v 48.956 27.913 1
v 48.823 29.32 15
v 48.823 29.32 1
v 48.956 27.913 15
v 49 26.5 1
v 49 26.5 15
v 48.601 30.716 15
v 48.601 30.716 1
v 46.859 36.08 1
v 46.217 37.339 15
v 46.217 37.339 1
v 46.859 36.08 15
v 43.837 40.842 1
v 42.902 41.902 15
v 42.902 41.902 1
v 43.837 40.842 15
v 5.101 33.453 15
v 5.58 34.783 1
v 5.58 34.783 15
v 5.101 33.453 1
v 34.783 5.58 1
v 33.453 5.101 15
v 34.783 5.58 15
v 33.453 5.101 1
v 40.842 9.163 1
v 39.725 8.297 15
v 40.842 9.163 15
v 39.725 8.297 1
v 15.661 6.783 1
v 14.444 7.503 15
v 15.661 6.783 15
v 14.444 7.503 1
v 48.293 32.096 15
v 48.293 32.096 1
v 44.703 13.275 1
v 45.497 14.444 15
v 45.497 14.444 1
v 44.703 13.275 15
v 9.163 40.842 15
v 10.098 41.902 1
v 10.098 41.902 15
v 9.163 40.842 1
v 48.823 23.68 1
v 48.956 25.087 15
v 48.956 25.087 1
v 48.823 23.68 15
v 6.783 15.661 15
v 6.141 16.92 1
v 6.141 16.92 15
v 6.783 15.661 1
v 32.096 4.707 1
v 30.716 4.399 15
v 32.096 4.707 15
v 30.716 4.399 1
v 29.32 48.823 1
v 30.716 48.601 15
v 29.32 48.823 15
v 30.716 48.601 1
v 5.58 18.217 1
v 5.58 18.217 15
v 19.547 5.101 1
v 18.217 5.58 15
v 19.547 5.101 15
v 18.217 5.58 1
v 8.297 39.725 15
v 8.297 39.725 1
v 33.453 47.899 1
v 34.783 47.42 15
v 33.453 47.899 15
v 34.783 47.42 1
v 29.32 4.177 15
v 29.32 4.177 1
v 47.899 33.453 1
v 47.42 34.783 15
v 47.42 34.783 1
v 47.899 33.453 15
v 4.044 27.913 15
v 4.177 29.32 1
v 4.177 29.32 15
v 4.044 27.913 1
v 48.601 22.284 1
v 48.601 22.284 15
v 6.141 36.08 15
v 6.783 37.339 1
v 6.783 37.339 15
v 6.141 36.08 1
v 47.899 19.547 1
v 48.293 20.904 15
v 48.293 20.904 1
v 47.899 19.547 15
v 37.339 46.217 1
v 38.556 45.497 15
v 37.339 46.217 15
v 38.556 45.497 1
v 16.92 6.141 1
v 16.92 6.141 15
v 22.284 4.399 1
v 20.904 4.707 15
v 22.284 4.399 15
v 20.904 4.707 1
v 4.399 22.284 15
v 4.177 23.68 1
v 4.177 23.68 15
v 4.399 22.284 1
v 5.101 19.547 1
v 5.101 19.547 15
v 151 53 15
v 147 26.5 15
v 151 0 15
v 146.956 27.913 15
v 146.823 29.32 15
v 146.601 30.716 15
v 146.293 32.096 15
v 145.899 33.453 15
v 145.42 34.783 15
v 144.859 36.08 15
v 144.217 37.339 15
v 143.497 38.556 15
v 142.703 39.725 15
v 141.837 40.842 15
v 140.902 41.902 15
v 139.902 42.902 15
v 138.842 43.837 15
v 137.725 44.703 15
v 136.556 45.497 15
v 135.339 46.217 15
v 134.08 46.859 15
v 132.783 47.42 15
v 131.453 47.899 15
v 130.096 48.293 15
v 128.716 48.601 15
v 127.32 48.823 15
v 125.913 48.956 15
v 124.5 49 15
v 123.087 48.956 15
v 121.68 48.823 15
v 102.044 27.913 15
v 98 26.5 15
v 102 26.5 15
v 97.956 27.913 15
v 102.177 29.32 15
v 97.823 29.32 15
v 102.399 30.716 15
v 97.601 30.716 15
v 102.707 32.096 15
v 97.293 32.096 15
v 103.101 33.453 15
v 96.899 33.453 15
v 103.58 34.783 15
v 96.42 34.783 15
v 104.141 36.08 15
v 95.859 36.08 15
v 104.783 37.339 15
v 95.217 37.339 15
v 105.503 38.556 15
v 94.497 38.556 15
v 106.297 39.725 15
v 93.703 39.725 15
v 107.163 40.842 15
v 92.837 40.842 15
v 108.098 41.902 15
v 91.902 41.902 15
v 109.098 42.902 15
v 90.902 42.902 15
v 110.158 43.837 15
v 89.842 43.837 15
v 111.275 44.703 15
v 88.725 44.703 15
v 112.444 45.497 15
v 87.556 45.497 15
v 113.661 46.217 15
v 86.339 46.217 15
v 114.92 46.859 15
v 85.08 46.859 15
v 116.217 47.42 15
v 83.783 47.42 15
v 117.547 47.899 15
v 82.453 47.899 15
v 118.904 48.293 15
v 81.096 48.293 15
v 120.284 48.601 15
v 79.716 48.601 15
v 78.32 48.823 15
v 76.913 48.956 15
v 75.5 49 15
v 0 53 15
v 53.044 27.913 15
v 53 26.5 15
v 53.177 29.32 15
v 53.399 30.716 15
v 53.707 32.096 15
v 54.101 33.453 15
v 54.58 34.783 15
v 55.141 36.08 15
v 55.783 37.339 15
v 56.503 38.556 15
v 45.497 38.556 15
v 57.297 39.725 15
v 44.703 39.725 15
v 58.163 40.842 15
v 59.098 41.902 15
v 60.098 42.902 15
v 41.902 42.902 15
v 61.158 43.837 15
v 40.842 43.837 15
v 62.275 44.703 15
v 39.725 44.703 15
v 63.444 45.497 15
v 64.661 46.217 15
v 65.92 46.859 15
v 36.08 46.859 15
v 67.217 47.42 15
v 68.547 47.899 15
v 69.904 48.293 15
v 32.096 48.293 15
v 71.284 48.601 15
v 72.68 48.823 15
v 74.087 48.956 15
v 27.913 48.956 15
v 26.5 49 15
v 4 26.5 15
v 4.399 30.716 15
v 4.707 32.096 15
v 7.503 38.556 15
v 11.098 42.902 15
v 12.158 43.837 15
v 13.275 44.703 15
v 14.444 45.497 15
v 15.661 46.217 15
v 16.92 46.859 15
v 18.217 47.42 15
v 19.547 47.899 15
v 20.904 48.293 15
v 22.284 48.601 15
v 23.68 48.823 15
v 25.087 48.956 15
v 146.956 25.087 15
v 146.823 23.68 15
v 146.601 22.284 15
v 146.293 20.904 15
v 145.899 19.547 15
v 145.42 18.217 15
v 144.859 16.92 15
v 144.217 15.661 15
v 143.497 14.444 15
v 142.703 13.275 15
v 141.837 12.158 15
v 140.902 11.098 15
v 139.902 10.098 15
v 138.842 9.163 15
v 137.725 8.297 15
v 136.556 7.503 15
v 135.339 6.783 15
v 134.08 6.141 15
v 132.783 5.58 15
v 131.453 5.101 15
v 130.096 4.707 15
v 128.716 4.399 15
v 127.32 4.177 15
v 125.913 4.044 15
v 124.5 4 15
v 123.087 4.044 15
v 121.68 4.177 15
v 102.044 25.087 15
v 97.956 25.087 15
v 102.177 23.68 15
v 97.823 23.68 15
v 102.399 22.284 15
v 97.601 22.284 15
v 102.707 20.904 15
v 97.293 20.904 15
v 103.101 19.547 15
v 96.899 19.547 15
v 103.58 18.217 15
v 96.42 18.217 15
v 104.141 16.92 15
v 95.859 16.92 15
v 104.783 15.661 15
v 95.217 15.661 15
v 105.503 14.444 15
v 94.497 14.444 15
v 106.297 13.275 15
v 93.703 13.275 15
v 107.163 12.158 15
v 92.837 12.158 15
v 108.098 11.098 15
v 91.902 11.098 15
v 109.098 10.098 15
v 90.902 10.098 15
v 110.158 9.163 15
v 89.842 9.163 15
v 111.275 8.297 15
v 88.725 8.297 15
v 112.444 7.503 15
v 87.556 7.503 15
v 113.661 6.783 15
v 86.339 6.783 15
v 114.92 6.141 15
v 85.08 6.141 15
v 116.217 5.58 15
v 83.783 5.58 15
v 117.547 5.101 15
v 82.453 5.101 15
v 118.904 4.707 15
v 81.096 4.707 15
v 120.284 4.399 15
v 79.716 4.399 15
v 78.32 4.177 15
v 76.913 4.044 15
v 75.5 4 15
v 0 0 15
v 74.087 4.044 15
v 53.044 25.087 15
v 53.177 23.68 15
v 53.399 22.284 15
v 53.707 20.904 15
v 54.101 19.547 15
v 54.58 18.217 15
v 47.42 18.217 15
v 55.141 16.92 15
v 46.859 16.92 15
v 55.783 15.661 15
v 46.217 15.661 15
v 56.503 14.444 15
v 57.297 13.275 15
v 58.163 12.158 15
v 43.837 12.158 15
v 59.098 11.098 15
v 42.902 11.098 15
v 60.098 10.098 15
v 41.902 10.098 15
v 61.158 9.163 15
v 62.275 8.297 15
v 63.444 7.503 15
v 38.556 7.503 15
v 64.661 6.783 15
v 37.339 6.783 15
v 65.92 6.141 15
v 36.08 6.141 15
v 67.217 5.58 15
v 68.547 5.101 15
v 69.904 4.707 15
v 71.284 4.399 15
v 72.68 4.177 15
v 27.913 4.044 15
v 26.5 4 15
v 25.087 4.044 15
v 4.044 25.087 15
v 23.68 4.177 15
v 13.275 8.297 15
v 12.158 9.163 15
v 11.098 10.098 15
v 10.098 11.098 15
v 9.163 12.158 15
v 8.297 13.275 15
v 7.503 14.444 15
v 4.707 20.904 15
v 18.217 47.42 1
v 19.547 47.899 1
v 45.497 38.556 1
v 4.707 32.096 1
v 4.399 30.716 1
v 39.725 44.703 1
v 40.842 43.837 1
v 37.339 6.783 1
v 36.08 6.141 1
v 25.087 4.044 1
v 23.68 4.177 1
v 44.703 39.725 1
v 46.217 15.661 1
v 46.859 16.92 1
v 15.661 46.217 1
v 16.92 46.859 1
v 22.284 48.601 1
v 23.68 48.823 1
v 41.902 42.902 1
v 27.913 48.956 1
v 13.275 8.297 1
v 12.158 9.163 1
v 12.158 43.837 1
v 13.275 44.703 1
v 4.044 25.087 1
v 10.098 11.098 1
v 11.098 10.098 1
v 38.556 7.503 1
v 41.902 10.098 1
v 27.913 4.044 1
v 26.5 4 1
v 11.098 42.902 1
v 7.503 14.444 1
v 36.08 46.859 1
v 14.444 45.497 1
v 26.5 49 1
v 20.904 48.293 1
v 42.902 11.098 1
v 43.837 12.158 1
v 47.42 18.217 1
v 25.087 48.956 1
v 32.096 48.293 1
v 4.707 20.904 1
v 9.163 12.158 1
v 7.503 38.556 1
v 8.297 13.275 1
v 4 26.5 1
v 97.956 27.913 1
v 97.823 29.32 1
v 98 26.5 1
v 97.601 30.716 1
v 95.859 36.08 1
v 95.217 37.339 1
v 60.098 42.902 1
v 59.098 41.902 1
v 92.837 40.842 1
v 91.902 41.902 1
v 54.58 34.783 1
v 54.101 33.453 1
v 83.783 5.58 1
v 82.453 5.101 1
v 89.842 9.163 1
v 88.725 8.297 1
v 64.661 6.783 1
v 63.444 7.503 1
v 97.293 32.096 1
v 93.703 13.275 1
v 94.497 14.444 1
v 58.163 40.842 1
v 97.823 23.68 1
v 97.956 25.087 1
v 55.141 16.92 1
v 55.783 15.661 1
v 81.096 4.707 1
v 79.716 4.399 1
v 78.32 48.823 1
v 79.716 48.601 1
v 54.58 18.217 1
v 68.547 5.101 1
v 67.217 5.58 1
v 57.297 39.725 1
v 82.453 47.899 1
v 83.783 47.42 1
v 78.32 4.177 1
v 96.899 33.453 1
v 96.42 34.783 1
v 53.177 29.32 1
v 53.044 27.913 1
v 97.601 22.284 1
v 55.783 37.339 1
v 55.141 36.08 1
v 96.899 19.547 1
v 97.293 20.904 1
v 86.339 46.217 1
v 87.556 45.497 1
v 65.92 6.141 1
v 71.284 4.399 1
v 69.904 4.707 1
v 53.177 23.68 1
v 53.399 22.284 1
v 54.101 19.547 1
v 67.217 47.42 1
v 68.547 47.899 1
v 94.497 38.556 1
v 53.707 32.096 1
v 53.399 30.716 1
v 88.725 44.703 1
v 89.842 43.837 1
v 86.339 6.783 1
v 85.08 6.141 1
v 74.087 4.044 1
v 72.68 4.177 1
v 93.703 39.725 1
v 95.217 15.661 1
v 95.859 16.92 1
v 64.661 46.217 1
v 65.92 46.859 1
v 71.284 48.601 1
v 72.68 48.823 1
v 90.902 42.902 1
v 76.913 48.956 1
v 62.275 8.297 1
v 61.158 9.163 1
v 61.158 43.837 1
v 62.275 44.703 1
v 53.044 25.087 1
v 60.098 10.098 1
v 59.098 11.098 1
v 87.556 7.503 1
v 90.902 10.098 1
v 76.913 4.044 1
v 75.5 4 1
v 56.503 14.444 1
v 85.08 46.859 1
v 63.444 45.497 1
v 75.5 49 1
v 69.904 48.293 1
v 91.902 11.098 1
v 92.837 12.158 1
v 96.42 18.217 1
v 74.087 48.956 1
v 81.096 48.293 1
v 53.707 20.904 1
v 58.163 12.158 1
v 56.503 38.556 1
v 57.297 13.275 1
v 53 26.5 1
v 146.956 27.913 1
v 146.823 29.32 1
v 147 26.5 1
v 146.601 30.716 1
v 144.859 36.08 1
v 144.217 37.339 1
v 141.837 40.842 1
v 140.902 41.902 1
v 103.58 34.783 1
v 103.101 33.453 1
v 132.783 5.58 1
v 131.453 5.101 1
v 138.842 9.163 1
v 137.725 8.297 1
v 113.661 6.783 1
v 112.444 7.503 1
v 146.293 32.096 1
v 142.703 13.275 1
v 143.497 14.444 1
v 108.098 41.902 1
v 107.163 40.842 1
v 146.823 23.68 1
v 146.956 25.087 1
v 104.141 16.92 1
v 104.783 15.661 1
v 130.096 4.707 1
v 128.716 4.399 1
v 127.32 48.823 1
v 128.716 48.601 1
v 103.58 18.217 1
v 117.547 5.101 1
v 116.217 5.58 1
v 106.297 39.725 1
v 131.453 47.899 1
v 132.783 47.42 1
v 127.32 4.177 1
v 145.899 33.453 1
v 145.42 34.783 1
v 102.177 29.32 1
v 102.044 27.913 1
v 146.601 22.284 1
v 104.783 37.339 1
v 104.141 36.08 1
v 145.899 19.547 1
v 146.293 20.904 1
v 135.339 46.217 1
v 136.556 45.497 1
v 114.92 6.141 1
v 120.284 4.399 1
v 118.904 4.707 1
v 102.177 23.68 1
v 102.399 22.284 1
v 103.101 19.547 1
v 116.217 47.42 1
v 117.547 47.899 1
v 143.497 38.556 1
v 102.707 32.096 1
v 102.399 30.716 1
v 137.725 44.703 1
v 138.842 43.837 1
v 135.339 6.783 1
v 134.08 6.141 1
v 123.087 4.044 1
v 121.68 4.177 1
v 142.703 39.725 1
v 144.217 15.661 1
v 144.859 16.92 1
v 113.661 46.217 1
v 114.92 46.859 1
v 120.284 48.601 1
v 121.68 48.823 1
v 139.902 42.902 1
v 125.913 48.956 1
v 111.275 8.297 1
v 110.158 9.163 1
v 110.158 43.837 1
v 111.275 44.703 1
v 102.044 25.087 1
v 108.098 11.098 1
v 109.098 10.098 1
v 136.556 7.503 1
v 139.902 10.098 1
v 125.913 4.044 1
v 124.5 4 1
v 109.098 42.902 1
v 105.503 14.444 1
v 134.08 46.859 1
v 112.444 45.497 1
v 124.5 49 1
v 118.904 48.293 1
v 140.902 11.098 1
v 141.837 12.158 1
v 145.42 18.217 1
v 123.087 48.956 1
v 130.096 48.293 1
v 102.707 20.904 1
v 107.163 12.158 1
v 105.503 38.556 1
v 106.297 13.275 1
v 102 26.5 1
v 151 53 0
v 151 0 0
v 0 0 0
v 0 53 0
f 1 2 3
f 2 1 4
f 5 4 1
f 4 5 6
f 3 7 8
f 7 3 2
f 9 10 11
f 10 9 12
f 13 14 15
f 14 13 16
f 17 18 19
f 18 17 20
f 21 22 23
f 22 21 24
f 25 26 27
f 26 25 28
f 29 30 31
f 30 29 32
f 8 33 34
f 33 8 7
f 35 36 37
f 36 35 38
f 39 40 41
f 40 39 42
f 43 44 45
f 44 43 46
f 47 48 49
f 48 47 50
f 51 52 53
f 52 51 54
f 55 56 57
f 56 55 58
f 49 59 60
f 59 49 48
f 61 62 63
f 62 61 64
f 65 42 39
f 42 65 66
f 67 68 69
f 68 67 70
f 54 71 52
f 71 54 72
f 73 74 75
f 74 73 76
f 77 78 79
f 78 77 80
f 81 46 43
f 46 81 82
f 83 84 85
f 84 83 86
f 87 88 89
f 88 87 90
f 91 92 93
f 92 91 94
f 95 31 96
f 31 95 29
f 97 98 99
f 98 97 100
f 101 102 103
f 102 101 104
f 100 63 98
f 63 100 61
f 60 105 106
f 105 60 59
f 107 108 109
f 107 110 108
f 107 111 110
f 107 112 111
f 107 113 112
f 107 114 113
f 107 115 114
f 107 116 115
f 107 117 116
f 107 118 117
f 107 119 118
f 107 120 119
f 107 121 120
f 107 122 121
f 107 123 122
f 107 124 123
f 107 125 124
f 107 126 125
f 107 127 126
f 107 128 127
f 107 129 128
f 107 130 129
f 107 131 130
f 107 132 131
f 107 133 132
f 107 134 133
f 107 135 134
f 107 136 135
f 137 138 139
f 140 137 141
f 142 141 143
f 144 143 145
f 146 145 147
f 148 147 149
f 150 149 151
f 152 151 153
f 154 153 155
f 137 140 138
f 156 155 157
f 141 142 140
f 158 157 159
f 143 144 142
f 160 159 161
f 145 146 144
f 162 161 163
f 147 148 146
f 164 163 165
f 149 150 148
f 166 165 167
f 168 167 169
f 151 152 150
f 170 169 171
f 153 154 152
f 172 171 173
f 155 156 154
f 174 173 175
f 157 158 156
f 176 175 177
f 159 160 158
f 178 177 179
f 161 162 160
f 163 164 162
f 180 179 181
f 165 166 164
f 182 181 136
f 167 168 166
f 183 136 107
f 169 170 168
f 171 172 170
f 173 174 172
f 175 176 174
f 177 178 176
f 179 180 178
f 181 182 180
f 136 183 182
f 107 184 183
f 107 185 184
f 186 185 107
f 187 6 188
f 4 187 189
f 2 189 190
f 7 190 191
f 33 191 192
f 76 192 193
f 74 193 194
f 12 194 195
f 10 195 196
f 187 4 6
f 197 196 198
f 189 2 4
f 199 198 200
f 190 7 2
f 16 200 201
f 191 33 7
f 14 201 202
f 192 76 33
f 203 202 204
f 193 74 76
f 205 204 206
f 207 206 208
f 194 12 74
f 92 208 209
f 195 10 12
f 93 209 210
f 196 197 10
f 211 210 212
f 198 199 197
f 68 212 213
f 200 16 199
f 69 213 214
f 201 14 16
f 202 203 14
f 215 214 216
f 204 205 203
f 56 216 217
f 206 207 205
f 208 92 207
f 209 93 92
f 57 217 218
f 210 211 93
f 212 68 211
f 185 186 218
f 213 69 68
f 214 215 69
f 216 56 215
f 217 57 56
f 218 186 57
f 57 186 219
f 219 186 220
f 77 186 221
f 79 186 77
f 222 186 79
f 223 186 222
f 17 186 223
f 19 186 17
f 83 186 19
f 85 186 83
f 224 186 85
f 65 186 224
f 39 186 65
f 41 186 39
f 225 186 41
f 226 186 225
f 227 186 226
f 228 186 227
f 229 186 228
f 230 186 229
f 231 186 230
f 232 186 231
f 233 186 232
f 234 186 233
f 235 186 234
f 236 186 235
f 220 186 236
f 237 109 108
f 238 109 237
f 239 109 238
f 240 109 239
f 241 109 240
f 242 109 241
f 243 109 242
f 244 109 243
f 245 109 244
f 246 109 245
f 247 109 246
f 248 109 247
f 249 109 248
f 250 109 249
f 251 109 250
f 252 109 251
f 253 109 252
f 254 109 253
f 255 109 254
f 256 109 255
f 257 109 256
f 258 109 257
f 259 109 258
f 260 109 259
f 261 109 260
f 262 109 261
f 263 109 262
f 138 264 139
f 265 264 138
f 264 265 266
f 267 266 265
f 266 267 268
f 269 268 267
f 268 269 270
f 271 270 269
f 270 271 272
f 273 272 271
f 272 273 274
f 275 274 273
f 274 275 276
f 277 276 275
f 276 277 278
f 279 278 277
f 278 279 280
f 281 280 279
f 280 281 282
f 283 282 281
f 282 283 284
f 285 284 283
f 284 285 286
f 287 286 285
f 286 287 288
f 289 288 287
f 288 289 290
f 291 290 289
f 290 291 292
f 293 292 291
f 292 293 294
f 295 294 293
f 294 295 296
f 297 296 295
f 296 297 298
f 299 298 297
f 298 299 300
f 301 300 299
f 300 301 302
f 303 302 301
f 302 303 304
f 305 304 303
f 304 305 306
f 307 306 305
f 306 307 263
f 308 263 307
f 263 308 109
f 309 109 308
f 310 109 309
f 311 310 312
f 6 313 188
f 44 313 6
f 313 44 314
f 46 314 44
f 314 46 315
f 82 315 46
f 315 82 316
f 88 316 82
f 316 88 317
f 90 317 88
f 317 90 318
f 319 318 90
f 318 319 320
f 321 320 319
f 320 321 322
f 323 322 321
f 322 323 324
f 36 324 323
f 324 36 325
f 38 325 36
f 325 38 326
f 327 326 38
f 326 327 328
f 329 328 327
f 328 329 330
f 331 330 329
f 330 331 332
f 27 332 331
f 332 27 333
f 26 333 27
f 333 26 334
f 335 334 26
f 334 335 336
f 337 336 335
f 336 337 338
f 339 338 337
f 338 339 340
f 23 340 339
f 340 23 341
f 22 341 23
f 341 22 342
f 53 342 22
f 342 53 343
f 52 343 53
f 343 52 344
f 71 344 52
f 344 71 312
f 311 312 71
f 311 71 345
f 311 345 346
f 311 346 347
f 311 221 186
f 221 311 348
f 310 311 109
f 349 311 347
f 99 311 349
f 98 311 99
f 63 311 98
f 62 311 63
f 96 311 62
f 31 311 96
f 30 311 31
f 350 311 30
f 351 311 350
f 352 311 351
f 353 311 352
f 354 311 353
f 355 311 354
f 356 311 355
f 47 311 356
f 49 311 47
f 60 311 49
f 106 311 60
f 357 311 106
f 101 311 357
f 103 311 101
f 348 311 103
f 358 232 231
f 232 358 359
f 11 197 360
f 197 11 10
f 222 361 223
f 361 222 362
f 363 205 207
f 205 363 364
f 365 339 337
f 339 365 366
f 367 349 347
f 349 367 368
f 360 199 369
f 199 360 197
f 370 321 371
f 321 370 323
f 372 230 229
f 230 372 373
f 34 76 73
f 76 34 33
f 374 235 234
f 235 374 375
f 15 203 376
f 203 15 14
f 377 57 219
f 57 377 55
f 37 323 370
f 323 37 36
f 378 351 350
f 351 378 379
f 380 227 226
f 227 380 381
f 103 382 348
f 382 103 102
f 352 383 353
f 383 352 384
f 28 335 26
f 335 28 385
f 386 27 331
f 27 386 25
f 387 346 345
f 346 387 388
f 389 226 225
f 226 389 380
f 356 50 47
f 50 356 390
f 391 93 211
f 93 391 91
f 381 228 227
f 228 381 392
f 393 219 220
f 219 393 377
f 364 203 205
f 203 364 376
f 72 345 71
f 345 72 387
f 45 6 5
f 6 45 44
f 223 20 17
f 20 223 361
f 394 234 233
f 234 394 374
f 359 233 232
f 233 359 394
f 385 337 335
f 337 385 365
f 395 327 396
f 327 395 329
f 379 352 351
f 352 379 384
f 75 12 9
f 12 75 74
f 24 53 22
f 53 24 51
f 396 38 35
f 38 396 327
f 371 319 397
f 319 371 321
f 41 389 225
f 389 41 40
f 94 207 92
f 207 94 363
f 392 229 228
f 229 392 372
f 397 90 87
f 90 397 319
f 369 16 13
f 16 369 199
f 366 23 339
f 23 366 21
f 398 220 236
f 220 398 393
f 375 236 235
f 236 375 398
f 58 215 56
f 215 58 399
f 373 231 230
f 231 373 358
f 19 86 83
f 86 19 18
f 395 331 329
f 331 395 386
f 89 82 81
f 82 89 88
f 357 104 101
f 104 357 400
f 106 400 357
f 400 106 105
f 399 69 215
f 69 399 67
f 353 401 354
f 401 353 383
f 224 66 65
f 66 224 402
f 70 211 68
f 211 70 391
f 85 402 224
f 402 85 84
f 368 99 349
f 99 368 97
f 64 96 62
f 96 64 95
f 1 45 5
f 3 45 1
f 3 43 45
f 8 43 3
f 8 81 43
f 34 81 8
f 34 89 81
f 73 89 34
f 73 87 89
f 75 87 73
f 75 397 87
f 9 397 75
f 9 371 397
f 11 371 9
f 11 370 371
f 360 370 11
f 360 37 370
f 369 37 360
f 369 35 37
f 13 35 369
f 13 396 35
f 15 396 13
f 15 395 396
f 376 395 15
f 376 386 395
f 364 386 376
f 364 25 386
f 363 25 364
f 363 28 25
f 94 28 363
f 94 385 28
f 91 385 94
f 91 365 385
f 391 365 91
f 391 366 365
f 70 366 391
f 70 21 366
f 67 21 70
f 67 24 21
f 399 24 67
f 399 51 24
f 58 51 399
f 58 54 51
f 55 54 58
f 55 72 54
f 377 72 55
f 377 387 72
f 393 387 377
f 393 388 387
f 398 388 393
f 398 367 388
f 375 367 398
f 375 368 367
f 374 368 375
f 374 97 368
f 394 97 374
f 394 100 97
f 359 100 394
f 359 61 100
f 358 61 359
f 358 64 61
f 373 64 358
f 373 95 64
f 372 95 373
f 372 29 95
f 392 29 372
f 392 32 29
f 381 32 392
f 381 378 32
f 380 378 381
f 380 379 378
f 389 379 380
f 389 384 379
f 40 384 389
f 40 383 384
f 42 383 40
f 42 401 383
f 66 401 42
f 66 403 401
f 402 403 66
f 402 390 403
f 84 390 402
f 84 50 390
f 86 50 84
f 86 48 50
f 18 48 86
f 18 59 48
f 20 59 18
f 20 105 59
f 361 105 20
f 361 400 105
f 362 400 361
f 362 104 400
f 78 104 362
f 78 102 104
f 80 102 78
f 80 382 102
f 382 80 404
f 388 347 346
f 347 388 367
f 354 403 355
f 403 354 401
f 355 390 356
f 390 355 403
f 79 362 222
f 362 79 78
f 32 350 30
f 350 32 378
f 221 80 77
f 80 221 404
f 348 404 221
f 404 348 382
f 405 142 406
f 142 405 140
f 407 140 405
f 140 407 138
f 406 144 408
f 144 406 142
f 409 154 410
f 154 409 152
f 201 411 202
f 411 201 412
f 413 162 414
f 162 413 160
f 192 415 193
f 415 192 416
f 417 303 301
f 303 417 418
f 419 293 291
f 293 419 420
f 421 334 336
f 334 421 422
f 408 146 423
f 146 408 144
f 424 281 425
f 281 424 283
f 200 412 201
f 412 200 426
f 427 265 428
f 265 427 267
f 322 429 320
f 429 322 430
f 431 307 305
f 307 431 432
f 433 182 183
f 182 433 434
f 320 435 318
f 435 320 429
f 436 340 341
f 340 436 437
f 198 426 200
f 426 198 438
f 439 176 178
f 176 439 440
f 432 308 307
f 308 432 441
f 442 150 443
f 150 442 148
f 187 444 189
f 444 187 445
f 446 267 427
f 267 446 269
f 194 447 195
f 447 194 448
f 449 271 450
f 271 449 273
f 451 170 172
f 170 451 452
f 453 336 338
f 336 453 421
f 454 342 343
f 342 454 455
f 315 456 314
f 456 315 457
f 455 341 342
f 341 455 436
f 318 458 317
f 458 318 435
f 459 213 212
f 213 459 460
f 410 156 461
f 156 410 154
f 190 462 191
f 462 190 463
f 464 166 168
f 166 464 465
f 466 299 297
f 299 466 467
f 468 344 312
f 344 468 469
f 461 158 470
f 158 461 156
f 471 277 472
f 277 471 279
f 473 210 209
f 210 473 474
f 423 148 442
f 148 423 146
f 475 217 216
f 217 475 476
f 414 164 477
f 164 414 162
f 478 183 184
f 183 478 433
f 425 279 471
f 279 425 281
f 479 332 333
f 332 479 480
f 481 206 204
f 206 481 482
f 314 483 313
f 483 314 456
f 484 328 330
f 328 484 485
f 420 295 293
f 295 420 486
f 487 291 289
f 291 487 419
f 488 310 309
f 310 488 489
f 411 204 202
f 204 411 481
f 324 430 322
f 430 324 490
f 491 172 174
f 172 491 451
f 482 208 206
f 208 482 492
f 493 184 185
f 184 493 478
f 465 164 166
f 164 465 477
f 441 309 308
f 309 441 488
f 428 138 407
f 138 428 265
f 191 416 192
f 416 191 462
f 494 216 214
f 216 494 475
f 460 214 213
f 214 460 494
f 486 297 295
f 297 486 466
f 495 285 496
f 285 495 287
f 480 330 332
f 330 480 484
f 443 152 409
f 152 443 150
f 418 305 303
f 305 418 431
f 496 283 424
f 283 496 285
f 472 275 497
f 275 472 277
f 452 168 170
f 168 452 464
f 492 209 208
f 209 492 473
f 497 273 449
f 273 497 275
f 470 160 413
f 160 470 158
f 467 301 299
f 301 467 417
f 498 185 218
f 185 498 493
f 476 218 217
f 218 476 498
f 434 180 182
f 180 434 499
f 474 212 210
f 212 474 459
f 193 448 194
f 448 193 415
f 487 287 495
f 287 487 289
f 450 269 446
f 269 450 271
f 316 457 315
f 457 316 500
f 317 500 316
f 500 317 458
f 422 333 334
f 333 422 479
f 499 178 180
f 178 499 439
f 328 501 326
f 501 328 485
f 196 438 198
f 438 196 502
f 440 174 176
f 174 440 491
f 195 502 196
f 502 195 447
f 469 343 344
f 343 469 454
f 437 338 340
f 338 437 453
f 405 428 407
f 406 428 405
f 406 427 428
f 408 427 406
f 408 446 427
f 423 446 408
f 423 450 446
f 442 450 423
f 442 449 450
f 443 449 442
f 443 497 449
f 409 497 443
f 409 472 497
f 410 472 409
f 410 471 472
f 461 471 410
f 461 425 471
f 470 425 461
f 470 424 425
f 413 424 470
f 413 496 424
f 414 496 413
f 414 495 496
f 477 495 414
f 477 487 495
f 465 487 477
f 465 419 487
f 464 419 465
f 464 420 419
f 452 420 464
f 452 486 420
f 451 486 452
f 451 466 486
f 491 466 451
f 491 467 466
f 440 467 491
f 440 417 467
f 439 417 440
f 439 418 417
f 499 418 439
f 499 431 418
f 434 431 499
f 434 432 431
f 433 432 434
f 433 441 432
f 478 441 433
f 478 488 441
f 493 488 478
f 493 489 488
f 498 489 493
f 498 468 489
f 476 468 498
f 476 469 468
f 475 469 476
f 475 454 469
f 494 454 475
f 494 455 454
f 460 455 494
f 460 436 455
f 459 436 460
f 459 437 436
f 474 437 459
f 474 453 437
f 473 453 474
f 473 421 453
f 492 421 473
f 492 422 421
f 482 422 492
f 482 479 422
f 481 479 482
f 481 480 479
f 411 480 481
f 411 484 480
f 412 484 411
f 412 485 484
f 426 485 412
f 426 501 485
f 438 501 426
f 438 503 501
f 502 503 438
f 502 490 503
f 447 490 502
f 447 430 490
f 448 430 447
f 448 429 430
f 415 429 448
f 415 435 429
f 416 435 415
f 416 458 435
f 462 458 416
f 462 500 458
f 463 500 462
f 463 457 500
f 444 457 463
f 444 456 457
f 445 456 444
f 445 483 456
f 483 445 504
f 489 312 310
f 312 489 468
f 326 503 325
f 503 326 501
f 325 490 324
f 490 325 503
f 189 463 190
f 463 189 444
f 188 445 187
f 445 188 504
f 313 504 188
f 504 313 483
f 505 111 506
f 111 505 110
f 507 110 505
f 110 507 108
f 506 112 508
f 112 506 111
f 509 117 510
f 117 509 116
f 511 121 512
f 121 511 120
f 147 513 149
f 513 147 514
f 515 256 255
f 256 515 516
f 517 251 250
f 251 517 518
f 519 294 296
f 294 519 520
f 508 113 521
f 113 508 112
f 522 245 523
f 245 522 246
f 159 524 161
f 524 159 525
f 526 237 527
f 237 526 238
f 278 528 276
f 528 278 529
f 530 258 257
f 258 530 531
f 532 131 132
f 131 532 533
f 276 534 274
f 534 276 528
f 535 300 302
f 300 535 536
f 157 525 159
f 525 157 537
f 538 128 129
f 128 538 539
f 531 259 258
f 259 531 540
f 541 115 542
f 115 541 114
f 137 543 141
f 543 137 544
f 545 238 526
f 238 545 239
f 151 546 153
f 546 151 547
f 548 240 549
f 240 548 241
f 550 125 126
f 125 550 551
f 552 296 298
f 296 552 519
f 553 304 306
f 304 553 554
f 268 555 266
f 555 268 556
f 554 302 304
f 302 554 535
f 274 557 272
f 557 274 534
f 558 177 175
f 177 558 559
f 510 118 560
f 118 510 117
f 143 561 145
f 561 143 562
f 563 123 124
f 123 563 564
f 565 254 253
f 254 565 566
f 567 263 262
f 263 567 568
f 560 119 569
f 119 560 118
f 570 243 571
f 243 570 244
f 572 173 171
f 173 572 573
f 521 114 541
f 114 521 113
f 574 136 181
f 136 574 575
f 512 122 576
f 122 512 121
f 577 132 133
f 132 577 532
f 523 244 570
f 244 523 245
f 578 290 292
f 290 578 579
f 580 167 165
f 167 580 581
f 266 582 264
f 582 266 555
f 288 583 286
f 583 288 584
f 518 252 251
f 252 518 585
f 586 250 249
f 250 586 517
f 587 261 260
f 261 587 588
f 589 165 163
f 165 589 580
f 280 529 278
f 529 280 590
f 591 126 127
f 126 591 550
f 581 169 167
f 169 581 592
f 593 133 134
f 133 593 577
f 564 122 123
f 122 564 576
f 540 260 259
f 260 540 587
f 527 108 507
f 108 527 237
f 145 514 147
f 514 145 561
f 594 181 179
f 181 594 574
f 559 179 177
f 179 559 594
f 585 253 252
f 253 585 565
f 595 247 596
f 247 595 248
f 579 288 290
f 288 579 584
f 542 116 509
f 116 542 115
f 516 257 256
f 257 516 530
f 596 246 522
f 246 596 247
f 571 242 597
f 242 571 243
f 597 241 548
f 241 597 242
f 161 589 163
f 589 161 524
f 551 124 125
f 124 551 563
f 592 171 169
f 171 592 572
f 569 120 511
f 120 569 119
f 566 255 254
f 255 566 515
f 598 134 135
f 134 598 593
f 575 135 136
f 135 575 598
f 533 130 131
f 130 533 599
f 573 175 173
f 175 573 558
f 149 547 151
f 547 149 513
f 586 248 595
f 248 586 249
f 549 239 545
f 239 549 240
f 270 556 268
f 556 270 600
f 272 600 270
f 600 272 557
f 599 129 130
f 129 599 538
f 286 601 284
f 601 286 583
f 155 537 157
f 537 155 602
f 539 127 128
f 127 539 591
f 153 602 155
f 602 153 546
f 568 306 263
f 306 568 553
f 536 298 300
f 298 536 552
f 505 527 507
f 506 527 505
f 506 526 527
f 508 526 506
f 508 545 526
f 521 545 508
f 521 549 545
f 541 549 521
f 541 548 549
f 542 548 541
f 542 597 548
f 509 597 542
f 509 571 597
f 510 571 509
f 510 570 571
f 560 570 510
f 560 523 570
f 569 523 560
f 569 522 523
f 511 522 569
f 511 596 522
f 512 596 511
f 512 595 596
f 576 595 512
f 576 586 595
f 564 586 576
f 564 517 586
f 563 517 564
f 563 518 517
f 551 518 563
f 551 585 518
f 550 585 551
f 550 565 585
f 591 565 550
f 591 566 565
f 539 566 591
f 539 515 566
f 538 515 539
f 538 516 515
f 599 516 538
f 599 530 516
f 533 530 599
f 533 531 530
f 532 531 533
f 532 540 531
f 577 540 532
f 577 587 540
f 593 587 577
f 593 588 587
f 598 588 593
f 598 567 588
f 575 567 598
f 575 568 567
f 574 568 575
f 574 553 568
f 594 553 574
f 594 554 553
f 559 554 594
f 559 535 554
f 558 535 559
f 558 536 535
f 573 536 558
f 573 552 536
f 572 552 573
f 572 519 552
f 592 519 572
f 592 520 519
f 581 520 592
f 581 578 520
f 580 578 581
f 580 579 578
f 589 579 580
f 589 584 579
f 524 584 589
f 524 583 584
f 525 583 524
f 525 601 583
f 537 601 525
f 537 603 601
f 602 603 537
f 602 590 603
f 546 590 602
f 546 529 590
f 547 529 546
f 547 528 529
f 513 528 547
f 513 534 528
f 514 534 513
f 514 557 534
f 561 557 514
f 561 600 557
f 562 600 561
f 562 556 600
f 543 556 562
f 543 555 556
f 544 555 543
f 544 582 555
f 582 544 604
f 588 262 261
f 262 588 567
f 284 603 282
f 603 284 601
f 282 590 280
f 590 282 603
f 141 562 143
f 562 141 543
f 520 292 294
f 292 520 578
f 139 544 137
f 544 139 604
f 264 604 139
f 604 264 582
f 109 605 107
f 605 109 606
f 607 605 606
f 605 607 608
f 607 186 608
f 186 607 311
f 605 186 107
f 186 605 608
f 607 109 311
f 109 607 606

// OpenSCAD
seperator = 4;

$fn = 100;

// Army Painter SpeedPaint bottle 25mm 
// liquitex bottle 36mm 
// Daler-Rowney FW bottle 45mm
cutout_d = 45;

cutout_r = cutout_d / 2;
cutout_h = 14;

rows = 1;
cols = 3;

tray_x = seperator + (cutout_d * cols) + (seperator * cols);
tray_y = seperator + (cutout_d * rows) + (seperator * rows);
tray_z = 15;
tray_bottom = tray_z - cutout_h;

difference() {
    cube([tray_x, tray_y, tray_z]);
    
    for (i = [1 : rows]) {
        for(j = [1: cols]) {
            echo ("hole: ", i, " ", j);
            
            x_offset = (seperator * j) + (cutout_r * j) + (cutout_r * (j - 1));
            y_offset = (seperator * i) + (cutout_r * i) + (cutout_r * (i - 1));
                      
            translate([x_offset, y_offset, tray_bottom]) {
                cylinder(h = cutout_h, r = cutout_r);
            }
        }
    }
}
